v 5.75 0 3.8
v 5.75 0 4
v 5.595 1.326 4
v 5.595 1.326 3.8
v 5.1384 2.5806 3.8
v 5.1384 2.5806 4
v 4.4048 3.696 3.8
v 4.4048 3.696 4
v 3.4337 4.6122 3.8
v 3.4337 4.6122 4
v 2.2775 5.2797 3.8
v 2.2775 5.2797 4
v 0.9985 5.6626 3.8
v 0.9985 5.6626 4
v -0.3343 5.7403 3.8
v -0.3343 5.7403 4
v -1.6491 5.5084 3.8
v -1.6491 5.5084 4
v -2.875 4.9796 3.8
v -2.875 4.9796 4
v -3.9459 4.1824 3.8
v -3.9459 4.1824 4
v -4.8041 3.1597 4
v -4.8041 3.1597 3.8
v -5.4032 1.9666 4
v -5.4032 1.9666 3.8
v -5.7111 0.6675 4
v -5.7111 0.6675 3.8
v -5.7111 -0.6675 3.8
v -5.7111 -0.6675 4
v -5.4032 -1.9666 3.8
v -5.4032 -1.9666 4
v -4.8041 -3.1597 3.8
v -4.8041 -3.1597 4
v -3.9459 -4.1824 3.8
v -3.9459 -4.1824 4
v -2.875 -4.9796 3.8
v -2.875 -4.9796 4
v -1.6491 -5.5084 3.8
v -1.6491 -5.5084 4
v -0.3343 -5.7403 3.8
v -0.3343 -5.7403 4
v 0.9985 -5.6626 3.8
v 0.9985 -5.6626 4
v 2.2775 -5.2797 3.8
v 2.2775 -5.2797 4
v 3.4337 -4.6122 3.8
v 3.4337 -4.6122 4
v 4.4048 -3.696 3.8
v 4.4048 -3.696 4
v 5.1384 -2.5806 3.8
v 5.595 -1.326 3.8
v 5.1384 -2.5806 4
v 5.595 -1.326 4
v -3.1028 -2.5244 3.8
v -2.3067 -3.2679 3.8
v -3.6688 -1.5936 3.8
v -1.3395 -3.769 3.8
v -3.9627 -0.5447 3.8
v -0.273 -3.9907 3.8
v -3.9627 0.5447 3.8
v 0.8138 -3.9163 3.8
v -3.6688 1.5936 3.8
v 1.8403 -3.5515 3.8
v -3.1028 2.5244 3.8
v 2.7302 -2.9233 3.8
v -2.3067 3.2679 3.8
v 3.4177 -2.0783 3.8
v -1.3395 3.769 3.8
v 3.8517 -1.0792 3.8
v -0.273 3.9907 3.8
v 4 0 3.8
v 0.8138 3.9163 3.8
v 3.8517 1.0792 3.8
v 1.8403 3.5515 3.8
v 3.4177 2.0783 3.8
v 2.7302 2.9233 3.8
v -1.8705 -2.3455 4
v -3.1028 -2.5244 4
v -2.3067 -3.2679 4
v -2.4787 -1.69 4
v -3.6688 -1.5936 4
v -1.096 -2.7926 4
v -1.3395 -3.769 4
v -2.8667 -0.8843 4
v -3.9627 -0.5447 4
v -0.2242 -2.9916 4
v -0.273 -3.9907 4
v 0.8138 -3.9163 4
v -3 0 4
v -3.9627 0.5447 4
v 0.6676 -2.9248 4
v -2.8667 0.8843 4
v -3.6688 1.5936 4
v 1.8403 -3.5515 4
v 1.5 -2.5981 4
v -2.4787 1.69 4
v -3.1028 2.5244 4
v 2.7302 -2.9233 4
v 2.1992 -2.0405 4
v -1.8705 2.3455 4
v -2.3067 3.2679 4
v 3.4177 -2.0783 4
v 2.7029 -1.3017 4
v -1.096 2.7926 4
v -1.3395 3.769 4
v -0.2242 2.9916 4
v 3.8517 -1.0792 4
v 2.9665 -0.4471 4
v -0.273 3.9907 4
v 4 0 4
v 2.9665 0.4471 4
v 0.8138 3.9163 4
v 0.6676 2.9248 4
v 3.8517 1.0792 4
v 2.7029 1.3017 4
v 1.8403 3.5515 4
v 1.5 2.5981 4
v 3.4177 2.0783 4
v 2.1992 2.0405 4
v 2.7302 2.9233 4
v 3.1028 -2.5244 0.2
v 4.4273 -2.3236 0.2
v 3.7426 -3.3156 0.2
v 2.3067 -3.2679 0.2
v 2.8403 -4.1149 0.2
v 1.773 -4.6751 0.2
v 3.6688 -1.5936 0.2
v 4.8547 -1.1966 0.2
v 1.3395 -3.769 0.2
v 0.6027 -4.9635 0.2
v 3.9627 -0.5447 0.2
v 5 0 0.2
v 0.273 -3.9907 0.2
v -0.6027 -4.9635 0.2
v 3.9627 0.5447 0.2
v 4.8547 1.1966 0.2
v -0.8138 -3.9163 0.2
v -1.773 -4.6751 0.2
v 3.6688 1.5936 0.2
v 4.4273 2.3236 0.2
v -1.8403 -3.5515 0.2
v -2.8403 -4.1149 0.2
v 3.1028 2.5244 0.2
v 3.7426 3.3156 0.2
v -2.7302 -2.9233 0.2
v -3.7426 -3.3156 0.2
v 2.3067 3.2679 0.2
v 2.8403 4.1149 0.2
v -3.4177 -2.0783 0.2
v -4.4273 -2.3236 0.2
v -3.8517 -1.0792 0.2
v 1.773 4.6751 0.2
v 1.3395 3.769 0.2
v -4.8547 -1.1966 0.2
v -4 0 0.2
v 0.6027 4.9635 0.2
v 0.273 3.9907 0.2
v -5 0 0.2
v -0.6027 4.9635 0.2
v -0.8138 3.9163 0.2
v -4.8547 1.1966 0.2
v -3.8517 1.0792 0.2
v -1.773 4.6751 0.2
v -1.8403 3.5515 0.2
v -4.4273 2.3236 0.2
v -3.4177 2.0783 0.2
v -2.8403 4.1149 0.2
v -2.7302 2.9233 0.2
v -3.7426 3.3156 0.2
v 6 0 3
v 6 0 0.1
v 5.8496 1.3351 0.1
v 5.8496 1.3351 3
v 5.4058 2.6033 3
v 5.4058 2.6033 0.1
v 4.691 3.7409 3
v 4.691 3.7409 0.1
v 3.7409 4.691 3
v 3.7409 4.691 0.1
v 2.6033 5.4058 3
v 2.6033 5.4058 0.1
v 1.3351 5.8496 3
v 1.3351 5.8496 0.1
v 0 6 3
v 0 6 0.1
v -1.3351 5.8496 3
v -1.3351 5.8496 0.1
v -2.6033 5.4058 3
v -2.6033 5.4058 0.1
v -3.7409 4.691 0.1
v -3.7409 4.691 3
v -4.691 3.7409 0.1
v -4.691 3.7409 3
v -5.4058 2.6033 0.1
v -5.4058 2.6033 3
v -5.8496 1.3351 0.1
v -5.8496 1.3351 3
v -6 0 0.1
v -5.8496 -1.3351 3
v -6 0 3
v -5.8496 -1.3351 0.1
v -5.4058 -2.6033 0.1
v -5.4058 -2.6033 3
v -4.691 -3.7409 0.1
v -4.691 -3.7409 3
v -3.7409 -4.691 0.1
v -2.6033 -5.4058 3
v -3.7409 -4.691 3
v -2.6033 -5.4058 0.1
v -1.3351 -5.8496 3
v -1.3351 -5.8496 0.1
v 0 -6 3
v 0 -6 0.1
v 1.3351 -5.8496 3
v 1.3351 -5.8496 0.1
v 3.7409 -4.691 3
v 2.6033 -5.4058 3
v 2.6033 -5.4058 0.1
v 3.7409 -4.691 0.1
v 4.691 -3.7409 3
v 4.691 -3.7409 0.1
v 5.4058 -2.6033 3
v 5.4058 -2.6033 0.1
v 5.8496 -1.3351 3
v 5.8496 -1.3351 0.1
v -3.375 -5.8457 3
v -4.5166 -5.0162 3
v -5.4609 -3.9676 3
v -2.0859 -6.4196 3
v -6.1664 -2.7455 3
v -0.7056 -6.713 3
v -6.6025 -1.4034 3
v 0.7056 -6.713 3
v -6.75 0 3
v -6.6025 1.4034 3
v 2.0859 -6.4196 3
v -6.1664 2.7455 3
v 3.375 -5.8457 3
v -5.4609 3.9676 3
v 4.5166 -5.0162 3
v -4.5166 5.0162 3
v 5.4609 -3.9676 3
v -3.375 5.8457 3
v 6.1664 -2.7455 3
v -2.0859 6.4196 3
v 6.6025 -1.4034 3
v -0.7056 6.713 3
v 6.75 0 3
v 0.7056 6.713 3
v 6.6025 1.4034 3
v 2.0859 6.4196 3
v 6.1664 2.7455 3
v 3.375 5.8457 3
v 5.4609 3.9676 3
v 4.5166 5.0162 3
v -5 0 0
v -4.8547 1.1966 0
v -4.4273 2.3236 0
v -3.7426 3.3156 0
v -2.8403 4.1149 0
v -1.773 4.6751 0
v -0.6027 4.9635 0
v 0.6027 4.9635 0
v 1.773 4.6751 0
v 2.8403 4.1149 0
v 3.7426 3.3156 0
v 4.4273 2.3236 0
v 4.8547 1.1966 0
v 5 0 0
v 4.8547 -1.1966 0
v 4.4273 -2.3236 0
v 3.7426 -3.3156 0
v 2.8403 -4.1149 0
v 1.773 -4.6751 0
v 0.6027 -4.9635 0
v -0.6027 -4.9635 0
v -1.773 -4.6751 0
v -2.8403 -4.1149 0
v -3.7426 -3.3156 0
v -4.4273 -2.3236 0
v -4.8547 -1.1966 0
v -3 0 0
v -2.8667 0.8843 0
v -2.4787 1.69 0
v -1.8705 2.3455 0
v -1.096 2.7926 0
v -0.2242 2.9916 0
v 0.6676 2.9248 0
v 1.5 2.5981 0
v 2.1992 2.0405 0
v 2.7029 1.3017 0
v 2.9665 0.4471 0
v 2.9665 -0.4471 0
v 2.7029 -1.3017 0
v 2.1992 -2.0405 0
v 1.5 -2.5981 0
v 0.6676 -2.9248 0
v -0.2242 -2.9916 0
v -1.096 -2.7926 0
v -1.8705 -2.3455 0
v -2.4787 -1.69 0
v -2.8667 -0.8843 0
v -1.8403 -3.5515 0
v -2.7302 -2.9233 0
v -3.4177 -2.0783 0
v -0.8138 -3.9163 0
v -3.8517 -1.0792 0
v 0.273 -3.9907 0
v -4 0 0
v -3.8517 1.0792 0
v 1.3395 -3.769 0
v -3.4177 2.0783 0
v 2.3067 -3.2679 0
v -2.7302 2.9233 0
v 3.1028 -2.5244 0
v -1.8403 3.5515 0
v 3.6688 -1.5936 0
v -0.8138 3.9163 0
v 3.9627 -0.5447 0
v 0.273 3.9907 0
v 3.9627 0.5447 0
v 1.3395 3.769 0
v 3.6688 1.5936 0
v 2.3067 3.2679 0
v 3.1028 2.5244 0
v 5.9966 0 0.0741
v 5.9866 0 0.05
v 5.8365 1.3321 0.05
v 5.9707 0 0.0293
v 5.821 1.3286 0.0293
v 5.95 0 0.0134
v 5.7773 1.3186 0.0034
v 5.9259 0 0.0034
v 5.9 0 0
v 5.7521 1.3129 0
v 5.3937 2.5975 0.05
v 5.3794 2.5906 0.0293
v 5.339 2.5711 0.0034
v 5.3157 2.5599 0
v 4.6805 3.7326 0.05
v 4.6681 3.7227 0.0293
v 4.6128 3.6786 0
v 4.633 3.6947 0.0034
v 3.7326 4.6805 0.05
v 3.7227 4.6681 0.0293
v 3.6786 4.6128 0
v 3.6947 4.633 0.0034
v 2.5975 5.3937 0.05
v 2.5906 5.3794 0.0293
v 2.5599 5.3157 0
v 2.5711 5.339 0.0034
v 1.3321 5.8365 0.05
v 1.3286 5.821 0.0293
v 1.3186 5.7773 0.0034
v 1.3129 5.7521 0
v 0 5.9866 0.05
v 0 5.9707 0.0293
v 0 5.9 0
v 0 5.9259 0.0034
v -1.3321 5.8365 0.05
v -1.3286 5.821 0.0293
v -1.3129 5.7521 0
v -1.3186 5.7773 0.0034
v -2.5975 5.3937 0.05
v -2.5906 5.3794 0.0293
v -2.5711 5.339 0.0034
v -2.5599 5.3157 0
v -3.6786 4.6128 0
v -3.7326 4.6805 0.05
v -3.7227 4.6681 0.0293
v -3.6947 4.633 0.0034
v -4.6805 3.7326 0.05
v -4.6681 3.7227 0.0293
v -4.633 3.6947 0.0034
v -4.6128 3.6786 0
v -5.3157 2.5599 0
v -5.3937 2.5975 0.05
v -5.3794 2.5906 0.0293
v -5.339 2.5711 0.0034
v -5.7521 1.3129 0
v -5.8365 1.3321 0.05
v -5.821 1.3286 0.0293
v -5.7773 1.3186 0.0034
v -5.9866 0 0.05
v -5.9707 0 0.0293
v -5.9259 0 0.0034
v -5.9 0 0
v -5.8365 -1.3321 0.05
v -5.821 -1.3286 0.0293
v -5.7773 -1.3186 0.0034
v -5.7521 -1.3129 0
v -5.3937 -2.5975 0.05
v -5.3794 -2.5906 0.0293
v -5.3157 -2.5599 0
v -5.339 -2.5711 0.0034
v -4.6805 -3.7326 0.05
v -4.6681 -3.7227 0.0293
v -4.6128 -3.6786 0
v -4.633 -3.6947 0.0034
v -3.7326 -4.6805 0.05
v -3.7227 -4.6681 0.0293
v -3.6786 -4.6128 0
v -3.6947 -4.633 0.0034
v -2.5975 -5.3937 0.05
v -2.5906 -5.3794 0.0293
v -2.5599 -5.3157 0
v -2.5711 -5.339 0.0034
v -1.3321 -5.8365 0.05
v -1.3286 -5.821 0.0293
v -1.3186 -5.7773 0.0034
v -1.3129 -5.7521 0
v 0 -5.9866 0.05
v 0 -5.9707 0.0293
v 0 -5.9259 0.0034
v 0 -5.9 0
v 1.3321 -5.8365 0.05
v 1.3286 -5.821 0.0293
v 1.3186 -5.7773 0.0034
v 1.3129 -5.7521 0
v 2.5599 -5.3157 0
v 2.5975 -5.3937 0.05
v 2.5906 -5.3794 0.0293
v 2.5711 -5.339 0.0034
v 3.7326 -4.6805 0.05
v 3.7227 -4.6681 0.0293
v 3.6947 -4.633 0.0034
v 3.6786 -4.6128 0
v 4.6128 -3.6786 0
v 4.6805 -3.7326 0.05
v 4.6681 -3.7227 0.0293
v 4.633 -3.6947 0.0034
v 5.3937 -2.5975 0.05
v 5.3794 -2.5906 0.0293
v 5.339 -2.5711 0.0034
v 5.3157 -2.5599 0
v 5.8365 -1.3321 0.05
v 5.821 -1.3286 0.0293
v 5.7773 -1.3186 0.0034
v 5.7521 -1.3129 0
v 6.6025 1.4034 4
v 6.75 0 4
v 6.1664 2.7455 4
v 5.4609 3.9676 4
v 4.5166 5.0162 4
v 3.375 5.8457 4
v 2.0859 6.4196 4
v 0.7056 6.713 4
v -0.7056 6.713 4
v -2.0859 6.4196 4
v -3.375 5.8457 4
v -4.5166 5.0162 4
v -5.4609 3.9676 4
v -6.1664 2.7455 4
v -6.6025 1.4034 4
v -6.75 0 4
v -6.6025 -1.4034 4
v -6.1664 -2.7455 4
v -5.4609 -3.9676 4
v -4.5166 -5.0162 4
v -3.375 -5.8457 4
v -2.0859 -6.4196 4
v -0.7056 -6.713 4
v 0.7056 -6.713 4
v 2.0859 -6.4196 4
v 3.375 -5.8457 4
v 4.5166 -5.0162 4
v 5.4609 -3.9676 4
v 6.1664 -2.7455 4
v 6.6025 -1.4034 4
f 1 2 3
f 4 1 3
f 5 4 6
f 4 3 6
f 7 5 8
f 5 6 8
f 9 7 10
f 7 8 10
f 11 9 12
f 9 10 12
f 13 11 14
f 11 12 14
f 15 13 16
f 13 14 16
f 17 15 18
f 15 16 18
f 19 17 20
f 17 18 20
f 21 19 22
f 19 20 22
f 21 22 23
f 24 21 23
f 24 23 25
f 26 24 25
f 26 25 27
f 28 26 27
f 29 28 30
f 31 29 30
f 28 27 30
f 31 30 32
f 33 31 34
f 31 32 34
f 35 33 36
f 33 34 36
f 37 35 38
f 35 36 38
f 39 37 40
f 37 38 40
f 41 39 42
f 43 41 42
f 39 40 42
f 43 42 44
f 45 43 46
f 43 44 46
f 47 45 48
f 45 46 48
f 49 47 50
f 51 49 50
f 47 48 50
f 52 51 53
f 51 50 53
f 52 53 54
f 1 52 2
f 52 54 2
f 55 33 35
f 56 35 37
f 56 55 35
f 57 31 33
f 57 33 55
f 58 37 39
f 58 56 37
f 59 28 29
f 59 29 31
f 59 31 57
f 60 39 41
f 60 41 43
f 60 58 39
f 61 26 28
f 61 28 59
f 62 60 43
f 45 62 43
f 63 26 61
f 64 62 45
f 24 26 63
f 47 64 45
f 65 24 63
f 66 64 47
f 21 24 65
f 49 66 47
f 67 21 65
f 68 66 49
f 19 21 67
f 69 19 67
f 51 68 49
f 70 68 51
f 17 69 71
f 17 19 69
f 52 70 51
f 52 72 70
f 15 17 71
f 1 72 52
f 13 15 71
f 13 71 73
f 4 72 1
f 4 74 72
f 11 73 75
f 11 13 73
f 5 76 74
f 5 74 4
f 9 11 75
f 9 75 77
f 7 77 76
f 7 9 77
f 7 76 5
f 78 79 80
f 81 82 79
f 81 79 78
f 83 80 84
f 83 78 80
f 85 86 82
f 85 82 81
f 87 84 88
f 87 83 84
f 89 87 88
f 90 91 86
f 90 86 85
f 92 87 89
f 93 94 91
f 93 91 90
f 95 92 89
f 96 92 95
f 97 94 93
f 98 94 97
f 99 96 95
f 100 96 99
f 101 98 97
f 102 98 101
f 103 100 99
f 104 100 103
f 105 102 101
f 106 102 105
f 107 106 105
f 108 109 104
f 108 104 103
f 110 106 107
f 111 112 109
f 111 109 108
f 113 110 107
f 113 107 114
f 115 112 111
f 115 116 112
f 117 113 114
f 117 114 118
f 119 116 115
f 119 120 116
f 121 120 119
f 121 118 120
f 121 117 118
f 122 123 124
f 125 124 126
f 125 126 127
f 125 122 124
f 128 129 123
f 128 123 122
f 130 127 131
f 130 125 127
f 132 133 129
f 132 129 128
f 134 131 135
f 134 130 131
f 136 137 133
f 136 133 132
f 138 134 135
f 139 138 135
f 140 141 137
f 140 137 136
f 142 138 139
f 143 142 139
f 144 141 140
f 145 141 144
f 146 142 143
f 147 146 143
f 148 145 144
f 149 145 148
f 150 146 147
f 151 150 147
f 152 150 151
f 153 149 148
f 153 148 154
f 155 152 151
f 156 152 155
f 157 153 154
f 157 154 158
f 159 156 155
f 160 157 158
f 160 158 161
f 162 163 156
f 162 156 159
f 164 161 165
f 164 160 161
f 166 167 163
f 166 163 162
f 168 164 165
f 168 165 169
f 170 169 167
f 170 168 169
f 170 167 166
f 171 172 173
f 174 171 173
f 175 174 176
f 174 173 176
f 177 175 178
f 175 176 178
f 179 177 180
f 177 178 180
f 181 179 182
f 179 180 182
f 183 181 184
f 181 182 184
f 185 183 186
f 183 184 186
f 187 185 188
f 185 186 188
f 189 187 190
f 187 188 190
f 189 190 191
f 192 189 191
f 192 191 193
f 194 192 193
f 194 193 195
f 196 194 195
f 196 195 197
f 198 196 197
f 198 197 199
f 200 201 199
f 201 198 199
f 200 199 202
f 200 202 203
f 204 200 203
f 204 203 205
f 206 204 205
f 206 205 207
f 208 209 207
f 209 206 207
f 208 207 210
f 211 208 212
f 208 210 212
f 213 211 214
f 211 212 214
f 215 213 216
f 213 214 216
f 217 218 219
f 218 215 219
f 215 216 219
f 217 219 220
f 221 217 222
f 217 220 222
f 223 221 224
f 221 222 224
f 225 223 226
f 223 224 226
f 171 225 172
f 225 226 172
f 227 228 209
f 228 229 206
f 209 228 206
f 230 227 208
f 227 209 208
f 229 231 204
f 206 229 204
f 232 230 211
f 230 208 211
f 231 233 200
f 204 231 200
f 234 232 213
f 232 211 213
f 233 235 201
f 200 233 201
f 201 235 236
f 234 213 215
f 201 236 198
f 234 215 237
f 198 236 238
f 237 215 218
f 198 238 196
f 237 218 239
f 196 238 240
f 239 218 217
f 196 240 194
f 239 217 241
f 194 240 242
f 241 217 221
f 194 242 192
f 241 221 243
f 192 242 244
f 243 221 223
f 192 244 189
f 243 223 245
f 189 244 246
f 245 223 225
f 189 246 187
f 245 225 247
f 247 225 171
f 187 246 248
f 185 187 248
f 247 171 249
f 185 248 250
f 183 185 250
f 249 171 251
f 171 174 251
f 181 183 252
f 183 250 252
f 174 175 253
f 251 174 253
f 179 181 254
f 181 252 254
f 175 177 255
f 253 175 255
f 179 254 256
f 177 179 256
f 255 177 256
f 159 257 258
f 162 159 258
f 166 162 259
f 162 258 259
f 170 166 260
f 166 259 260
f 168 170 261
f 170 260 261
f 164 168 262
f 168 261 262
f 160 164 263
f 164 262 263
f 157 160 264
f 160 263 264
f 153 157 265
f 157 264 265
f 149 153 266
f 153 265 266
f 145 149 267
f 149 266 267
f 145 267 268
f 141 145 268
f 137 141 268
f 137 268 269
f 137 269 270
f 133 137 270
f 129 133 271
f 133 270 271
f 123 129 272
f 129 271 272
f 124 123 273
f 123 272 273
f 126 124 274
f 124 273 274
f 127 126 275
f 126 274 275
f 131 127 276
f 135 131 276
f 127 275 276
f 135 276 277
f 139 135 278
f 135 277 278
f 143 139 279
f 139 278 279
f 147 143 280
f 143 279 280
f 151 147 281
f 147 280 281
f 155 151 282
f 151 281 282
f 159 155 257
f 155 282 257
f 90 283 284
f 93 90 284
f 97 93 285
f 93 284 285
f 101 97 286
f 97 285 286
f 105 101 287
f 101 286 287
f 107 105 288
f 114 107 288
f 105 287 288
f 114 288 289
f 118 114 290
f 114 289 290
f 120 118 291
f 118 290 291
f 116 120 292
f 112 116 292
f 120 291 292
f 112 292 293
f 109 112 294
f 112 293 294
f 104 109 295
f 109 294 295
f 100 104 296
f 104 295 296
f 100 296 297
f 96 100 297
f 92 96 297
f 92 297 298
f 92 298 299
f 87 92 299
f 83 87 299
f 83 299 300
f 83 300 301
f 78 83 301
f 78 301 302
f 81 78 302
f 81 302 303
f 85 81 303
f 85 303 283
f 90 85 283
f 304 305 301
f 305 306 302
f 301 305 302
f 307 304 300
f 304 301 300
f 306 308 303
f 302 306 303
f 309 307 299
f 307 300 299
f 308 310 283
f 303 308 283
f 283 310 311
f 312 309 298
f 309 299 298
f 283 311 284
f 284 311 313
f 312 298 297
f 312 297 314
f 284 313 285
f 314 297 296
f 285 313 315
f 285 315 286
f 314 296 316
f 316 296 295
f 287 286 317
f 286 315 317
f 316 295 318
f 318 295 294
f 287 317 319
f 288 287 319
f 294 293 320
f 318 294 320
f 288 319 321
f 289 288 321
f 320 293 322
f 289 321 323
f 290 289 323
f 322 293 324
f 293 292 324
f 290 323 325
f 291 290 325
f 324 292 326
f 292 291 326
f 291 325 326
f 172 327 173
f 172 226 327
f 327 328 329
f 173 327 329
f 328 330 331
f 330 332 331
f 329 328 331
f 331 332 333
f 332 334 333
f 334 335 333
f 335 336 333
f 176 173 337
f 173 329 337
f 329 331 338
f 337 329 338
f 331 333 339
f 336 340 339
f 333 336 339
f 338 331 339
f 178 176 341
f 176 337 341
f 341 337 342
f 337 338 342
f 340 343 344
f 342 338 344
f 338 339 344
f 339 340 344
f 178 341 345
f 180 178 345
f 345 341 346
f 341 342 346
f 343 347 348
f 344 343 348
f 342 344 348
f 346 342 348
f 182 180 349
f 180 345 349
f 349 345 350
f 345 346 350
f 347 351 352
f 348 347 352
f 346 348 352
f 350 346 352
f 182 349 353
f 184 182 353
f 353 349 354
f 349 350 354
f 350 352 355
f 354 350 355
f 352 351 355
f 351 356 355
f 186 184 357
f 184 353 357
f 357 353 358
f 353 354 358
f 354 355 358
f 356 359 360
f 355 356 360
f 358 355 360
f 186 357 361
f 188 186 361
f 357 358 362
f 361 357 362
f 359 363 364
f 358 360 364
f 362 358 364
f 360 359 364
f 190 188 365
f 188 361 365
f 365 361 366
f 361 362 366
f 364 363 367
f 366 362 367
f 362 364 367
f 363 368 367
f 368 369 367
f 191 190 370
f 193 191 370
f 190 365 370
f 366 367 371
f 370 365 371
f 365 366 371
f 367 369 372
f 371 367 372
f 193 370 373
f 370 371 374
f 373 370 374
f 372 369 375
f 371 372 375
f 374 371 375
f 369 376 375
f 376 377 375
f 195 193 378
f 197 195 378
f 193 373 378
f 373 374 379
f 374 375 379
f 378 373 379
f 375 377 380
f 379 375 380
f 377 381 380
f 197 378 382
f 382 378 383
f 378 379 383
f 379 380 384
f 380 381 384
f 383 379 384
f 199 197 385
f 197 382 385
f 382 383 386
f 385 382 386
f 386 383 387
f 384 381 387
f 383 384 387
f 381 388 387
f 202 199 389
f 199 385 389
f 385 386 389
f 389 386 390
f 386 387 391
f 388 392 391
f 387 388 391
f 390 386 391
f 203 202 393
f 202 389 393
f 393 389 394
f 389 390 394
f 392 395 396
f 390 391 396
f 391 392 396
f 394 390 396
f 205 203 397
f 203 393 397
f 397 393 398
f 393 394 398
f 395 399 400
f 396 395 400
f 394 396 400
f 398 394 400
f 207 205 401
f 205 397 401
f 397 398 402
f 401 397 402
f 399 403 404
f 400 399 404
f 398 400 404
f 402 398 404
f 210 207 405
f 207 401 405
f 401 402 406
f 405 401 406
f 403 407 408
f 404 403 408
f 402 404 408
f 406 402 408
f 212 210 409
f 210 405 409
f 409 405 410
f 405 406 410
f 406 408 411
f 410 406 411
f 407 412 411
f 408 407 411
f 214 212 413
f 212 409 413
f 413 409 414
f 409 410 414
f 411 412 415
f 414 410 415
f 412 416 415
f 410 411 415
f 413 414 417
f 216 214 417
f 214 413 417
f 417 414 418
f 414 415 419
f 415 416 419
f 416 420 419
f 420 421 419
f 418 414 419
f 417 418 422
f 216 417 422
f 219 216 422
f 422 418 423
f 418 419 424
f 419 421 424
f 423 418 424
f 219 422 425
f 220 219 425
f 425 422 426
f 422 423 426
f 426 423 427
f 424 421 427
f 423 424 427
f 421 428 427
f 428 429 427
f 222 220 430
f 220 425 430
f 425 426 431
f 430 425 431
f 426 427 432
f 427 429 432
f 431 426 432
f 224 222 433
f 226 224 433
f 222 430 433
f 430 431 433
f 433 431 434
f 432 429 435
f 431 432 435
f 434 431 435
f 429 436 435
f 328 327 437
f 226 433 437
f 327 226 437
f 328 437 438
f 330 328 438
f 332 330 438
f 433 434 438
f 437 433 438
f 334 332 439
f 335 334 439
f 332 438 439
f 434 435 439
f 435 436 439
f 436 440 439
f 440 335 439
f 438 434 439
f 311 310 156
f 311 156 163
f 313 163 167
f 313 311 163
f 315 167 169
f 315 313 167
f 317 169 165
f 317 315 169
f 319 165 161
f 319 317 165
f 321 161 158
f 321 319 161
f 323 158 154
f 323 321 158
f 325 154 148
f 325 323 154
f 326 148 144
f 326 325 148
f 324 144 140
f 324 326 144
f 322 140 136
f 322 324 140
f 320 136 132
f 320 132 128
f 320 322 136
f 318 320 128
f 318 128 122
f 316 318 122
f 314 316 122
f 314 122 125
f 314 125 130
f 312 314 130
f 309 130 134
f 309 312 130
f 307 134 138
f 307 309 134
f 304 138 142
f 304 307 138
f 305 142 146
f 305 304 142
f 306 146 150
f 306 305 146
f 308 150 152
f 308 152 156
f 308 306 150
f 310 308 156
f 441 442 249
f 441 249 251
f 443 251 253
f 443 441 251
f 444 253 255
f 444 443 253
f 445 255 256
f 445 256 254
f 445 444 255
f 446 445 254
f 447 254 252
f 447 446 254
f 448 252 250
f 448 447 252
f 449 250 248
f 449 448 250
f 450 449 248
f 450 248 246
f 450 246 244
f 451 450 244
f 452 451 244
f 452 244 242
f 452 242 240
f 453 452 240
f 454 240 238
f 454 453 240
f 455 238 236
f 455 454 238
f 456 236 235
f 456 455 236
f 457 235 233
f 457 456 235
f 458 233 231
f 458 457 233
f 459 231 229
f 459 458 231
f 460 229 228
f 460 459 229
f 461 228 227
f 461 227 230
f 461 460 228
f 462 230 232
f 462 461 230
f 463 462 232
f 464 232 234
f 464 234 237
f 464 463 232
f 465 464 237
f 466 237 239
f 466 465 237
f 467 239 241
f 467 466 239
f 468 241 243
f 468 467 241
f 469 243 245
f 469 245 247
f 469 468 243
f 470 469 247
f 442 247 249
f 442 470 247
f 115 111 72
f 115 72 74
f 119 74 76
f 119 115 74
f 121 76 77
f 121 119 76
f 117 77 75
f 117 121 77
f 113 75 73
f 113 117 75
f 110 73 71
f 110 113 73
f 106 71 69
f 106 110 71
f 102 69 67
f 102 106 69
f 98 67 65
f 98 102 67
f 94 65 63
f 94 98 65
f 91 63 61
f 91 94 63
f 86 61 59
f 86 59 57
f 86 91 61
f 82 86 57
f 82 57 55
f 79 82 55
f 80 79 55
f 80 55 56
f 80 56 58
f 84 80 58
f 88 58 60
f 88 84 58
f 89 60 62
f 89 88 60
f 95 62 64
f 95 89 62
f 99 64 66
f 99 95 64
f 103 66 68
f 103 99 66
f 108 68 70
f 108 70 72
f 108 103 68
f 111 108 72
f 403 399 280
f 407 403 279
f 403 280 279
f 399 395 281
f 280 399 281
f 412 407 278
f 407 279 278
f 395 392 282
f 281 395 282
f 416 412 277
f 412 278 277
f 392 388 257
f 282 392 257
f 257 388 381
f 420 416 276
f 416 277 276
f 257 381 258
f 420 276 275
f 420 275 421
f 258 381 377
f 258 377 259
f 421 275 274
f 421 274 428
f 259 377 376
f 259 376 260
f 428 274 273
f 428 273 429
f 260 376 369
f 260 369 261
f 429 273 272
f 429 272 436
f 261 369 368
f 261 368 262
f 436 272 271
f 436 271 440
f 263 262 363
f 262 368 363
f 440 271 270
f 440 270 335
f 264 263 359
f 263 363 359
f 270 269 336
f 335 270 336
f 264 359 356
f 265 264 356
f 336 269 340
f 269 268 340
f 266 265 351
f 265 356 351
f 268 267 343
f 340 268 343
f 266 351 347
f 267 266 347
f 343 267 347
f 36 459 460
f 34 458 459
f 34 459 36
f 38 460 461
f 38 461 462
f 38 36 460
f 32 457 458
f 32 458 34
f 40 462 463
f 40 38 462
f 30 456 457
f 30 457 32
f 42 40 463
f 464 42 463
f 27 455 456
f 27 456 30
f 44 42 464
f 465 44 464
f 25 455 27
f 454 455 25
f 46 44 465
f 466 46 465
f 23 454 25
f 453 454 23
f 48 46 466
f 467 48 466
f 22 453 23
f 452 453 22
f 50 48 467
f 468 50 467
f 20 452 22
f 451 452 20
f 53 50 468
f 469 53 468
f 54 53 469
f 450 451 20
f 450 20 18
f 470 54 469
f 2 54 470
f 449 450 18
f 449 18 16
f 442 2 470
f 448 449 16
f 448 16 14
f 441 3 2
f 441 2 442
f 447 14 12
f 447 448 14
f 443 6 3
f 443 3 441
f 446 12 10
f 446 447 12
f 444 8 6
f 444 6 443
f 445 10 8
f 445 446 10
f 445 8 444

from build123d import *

# Parameters (mm, degrees)
SKETCH_1_R          = 6
EXTRUDE_1_DEPTH     = 4
SKETCH_2_R          = 6.75
EXTRUDE_2_DEPTH     = 1
SKETCH_3_R          = 3
CUT_EXTRUDE_1_DEPTH = 5
SKETCH_4_R          = 5
SKETCH_4_R_2        = 4
CUT_EXTRUDE_2_DEPTH = 0.2
SKETCH_5_R          = 5.75
SKETCH_5_R_2        = 4
CUT_EXTRUDE_3_DEPTH = 0.2
FILLET_1_R          = 0.1


with BuildPart() as part:
    # 草圖1 → 填料-伸長1 (new body)
    with BuildSketch(Plane.XY):
        Circle(SKETCH_1_R)
    extrude(amount=EXTRUDE_1_DEPTH)

    # 草圖2 → 填料-伸長2 (add)
    with BuildSketch(Plane.XY.offset(4)):
        Circle(SKETCH_2_R)
    extrude(amount=-EXTRUDE_2_DEPTH)

    # 草圖3 → 除料-伸長1 (cut, through all)
    with BuildSketch(Plane(origin=(0, 0, 0), x_dir=(-1, 0, 0), z_dir=(0, 0, -1))):
        Circle(SKETCH_3_R)
    extrude(amount=-CUT_EXTRUDE_1_DEPTH, mode=Mode.SUBTRACT)

    # 草圖4 → 除料-伸長2 (cut)
    with BuildSketch(Plane(origin=(0, 0, 0), x_dir=(-1, 0, 0), z_dir=(0, 0, -1))):
        Circle(SKETCH_4_R)
        Circle(SKETCH_4_R_2, mode=Mode.SUBTRACT)
    extrude(amount=-CUT_EXTRUDE_2_DEPTH, mode=Mode.SUBTRACT)

    # 草圖5 → 除料-伸長3 (cut)
    with BuildSketch(Plane.XY.offset(4)):
        Circle(SKETCH_5_R)
        Circle(SKETCH_5_R_2, mode=Mode.SUBTRACT)
    extrude(amount=-CUT_EXTRUDE_3_DEPTH, mode=Mode.SUBTRACT)

    # 圓角1
    fillet_1_edges = [part.edges().sort_by_distance(p)[0] for p in [
        (-6, 0, 0),
    ]]
    fillet(fillet_1_edges, radius=FILLET_1_R)


solid = part.part
